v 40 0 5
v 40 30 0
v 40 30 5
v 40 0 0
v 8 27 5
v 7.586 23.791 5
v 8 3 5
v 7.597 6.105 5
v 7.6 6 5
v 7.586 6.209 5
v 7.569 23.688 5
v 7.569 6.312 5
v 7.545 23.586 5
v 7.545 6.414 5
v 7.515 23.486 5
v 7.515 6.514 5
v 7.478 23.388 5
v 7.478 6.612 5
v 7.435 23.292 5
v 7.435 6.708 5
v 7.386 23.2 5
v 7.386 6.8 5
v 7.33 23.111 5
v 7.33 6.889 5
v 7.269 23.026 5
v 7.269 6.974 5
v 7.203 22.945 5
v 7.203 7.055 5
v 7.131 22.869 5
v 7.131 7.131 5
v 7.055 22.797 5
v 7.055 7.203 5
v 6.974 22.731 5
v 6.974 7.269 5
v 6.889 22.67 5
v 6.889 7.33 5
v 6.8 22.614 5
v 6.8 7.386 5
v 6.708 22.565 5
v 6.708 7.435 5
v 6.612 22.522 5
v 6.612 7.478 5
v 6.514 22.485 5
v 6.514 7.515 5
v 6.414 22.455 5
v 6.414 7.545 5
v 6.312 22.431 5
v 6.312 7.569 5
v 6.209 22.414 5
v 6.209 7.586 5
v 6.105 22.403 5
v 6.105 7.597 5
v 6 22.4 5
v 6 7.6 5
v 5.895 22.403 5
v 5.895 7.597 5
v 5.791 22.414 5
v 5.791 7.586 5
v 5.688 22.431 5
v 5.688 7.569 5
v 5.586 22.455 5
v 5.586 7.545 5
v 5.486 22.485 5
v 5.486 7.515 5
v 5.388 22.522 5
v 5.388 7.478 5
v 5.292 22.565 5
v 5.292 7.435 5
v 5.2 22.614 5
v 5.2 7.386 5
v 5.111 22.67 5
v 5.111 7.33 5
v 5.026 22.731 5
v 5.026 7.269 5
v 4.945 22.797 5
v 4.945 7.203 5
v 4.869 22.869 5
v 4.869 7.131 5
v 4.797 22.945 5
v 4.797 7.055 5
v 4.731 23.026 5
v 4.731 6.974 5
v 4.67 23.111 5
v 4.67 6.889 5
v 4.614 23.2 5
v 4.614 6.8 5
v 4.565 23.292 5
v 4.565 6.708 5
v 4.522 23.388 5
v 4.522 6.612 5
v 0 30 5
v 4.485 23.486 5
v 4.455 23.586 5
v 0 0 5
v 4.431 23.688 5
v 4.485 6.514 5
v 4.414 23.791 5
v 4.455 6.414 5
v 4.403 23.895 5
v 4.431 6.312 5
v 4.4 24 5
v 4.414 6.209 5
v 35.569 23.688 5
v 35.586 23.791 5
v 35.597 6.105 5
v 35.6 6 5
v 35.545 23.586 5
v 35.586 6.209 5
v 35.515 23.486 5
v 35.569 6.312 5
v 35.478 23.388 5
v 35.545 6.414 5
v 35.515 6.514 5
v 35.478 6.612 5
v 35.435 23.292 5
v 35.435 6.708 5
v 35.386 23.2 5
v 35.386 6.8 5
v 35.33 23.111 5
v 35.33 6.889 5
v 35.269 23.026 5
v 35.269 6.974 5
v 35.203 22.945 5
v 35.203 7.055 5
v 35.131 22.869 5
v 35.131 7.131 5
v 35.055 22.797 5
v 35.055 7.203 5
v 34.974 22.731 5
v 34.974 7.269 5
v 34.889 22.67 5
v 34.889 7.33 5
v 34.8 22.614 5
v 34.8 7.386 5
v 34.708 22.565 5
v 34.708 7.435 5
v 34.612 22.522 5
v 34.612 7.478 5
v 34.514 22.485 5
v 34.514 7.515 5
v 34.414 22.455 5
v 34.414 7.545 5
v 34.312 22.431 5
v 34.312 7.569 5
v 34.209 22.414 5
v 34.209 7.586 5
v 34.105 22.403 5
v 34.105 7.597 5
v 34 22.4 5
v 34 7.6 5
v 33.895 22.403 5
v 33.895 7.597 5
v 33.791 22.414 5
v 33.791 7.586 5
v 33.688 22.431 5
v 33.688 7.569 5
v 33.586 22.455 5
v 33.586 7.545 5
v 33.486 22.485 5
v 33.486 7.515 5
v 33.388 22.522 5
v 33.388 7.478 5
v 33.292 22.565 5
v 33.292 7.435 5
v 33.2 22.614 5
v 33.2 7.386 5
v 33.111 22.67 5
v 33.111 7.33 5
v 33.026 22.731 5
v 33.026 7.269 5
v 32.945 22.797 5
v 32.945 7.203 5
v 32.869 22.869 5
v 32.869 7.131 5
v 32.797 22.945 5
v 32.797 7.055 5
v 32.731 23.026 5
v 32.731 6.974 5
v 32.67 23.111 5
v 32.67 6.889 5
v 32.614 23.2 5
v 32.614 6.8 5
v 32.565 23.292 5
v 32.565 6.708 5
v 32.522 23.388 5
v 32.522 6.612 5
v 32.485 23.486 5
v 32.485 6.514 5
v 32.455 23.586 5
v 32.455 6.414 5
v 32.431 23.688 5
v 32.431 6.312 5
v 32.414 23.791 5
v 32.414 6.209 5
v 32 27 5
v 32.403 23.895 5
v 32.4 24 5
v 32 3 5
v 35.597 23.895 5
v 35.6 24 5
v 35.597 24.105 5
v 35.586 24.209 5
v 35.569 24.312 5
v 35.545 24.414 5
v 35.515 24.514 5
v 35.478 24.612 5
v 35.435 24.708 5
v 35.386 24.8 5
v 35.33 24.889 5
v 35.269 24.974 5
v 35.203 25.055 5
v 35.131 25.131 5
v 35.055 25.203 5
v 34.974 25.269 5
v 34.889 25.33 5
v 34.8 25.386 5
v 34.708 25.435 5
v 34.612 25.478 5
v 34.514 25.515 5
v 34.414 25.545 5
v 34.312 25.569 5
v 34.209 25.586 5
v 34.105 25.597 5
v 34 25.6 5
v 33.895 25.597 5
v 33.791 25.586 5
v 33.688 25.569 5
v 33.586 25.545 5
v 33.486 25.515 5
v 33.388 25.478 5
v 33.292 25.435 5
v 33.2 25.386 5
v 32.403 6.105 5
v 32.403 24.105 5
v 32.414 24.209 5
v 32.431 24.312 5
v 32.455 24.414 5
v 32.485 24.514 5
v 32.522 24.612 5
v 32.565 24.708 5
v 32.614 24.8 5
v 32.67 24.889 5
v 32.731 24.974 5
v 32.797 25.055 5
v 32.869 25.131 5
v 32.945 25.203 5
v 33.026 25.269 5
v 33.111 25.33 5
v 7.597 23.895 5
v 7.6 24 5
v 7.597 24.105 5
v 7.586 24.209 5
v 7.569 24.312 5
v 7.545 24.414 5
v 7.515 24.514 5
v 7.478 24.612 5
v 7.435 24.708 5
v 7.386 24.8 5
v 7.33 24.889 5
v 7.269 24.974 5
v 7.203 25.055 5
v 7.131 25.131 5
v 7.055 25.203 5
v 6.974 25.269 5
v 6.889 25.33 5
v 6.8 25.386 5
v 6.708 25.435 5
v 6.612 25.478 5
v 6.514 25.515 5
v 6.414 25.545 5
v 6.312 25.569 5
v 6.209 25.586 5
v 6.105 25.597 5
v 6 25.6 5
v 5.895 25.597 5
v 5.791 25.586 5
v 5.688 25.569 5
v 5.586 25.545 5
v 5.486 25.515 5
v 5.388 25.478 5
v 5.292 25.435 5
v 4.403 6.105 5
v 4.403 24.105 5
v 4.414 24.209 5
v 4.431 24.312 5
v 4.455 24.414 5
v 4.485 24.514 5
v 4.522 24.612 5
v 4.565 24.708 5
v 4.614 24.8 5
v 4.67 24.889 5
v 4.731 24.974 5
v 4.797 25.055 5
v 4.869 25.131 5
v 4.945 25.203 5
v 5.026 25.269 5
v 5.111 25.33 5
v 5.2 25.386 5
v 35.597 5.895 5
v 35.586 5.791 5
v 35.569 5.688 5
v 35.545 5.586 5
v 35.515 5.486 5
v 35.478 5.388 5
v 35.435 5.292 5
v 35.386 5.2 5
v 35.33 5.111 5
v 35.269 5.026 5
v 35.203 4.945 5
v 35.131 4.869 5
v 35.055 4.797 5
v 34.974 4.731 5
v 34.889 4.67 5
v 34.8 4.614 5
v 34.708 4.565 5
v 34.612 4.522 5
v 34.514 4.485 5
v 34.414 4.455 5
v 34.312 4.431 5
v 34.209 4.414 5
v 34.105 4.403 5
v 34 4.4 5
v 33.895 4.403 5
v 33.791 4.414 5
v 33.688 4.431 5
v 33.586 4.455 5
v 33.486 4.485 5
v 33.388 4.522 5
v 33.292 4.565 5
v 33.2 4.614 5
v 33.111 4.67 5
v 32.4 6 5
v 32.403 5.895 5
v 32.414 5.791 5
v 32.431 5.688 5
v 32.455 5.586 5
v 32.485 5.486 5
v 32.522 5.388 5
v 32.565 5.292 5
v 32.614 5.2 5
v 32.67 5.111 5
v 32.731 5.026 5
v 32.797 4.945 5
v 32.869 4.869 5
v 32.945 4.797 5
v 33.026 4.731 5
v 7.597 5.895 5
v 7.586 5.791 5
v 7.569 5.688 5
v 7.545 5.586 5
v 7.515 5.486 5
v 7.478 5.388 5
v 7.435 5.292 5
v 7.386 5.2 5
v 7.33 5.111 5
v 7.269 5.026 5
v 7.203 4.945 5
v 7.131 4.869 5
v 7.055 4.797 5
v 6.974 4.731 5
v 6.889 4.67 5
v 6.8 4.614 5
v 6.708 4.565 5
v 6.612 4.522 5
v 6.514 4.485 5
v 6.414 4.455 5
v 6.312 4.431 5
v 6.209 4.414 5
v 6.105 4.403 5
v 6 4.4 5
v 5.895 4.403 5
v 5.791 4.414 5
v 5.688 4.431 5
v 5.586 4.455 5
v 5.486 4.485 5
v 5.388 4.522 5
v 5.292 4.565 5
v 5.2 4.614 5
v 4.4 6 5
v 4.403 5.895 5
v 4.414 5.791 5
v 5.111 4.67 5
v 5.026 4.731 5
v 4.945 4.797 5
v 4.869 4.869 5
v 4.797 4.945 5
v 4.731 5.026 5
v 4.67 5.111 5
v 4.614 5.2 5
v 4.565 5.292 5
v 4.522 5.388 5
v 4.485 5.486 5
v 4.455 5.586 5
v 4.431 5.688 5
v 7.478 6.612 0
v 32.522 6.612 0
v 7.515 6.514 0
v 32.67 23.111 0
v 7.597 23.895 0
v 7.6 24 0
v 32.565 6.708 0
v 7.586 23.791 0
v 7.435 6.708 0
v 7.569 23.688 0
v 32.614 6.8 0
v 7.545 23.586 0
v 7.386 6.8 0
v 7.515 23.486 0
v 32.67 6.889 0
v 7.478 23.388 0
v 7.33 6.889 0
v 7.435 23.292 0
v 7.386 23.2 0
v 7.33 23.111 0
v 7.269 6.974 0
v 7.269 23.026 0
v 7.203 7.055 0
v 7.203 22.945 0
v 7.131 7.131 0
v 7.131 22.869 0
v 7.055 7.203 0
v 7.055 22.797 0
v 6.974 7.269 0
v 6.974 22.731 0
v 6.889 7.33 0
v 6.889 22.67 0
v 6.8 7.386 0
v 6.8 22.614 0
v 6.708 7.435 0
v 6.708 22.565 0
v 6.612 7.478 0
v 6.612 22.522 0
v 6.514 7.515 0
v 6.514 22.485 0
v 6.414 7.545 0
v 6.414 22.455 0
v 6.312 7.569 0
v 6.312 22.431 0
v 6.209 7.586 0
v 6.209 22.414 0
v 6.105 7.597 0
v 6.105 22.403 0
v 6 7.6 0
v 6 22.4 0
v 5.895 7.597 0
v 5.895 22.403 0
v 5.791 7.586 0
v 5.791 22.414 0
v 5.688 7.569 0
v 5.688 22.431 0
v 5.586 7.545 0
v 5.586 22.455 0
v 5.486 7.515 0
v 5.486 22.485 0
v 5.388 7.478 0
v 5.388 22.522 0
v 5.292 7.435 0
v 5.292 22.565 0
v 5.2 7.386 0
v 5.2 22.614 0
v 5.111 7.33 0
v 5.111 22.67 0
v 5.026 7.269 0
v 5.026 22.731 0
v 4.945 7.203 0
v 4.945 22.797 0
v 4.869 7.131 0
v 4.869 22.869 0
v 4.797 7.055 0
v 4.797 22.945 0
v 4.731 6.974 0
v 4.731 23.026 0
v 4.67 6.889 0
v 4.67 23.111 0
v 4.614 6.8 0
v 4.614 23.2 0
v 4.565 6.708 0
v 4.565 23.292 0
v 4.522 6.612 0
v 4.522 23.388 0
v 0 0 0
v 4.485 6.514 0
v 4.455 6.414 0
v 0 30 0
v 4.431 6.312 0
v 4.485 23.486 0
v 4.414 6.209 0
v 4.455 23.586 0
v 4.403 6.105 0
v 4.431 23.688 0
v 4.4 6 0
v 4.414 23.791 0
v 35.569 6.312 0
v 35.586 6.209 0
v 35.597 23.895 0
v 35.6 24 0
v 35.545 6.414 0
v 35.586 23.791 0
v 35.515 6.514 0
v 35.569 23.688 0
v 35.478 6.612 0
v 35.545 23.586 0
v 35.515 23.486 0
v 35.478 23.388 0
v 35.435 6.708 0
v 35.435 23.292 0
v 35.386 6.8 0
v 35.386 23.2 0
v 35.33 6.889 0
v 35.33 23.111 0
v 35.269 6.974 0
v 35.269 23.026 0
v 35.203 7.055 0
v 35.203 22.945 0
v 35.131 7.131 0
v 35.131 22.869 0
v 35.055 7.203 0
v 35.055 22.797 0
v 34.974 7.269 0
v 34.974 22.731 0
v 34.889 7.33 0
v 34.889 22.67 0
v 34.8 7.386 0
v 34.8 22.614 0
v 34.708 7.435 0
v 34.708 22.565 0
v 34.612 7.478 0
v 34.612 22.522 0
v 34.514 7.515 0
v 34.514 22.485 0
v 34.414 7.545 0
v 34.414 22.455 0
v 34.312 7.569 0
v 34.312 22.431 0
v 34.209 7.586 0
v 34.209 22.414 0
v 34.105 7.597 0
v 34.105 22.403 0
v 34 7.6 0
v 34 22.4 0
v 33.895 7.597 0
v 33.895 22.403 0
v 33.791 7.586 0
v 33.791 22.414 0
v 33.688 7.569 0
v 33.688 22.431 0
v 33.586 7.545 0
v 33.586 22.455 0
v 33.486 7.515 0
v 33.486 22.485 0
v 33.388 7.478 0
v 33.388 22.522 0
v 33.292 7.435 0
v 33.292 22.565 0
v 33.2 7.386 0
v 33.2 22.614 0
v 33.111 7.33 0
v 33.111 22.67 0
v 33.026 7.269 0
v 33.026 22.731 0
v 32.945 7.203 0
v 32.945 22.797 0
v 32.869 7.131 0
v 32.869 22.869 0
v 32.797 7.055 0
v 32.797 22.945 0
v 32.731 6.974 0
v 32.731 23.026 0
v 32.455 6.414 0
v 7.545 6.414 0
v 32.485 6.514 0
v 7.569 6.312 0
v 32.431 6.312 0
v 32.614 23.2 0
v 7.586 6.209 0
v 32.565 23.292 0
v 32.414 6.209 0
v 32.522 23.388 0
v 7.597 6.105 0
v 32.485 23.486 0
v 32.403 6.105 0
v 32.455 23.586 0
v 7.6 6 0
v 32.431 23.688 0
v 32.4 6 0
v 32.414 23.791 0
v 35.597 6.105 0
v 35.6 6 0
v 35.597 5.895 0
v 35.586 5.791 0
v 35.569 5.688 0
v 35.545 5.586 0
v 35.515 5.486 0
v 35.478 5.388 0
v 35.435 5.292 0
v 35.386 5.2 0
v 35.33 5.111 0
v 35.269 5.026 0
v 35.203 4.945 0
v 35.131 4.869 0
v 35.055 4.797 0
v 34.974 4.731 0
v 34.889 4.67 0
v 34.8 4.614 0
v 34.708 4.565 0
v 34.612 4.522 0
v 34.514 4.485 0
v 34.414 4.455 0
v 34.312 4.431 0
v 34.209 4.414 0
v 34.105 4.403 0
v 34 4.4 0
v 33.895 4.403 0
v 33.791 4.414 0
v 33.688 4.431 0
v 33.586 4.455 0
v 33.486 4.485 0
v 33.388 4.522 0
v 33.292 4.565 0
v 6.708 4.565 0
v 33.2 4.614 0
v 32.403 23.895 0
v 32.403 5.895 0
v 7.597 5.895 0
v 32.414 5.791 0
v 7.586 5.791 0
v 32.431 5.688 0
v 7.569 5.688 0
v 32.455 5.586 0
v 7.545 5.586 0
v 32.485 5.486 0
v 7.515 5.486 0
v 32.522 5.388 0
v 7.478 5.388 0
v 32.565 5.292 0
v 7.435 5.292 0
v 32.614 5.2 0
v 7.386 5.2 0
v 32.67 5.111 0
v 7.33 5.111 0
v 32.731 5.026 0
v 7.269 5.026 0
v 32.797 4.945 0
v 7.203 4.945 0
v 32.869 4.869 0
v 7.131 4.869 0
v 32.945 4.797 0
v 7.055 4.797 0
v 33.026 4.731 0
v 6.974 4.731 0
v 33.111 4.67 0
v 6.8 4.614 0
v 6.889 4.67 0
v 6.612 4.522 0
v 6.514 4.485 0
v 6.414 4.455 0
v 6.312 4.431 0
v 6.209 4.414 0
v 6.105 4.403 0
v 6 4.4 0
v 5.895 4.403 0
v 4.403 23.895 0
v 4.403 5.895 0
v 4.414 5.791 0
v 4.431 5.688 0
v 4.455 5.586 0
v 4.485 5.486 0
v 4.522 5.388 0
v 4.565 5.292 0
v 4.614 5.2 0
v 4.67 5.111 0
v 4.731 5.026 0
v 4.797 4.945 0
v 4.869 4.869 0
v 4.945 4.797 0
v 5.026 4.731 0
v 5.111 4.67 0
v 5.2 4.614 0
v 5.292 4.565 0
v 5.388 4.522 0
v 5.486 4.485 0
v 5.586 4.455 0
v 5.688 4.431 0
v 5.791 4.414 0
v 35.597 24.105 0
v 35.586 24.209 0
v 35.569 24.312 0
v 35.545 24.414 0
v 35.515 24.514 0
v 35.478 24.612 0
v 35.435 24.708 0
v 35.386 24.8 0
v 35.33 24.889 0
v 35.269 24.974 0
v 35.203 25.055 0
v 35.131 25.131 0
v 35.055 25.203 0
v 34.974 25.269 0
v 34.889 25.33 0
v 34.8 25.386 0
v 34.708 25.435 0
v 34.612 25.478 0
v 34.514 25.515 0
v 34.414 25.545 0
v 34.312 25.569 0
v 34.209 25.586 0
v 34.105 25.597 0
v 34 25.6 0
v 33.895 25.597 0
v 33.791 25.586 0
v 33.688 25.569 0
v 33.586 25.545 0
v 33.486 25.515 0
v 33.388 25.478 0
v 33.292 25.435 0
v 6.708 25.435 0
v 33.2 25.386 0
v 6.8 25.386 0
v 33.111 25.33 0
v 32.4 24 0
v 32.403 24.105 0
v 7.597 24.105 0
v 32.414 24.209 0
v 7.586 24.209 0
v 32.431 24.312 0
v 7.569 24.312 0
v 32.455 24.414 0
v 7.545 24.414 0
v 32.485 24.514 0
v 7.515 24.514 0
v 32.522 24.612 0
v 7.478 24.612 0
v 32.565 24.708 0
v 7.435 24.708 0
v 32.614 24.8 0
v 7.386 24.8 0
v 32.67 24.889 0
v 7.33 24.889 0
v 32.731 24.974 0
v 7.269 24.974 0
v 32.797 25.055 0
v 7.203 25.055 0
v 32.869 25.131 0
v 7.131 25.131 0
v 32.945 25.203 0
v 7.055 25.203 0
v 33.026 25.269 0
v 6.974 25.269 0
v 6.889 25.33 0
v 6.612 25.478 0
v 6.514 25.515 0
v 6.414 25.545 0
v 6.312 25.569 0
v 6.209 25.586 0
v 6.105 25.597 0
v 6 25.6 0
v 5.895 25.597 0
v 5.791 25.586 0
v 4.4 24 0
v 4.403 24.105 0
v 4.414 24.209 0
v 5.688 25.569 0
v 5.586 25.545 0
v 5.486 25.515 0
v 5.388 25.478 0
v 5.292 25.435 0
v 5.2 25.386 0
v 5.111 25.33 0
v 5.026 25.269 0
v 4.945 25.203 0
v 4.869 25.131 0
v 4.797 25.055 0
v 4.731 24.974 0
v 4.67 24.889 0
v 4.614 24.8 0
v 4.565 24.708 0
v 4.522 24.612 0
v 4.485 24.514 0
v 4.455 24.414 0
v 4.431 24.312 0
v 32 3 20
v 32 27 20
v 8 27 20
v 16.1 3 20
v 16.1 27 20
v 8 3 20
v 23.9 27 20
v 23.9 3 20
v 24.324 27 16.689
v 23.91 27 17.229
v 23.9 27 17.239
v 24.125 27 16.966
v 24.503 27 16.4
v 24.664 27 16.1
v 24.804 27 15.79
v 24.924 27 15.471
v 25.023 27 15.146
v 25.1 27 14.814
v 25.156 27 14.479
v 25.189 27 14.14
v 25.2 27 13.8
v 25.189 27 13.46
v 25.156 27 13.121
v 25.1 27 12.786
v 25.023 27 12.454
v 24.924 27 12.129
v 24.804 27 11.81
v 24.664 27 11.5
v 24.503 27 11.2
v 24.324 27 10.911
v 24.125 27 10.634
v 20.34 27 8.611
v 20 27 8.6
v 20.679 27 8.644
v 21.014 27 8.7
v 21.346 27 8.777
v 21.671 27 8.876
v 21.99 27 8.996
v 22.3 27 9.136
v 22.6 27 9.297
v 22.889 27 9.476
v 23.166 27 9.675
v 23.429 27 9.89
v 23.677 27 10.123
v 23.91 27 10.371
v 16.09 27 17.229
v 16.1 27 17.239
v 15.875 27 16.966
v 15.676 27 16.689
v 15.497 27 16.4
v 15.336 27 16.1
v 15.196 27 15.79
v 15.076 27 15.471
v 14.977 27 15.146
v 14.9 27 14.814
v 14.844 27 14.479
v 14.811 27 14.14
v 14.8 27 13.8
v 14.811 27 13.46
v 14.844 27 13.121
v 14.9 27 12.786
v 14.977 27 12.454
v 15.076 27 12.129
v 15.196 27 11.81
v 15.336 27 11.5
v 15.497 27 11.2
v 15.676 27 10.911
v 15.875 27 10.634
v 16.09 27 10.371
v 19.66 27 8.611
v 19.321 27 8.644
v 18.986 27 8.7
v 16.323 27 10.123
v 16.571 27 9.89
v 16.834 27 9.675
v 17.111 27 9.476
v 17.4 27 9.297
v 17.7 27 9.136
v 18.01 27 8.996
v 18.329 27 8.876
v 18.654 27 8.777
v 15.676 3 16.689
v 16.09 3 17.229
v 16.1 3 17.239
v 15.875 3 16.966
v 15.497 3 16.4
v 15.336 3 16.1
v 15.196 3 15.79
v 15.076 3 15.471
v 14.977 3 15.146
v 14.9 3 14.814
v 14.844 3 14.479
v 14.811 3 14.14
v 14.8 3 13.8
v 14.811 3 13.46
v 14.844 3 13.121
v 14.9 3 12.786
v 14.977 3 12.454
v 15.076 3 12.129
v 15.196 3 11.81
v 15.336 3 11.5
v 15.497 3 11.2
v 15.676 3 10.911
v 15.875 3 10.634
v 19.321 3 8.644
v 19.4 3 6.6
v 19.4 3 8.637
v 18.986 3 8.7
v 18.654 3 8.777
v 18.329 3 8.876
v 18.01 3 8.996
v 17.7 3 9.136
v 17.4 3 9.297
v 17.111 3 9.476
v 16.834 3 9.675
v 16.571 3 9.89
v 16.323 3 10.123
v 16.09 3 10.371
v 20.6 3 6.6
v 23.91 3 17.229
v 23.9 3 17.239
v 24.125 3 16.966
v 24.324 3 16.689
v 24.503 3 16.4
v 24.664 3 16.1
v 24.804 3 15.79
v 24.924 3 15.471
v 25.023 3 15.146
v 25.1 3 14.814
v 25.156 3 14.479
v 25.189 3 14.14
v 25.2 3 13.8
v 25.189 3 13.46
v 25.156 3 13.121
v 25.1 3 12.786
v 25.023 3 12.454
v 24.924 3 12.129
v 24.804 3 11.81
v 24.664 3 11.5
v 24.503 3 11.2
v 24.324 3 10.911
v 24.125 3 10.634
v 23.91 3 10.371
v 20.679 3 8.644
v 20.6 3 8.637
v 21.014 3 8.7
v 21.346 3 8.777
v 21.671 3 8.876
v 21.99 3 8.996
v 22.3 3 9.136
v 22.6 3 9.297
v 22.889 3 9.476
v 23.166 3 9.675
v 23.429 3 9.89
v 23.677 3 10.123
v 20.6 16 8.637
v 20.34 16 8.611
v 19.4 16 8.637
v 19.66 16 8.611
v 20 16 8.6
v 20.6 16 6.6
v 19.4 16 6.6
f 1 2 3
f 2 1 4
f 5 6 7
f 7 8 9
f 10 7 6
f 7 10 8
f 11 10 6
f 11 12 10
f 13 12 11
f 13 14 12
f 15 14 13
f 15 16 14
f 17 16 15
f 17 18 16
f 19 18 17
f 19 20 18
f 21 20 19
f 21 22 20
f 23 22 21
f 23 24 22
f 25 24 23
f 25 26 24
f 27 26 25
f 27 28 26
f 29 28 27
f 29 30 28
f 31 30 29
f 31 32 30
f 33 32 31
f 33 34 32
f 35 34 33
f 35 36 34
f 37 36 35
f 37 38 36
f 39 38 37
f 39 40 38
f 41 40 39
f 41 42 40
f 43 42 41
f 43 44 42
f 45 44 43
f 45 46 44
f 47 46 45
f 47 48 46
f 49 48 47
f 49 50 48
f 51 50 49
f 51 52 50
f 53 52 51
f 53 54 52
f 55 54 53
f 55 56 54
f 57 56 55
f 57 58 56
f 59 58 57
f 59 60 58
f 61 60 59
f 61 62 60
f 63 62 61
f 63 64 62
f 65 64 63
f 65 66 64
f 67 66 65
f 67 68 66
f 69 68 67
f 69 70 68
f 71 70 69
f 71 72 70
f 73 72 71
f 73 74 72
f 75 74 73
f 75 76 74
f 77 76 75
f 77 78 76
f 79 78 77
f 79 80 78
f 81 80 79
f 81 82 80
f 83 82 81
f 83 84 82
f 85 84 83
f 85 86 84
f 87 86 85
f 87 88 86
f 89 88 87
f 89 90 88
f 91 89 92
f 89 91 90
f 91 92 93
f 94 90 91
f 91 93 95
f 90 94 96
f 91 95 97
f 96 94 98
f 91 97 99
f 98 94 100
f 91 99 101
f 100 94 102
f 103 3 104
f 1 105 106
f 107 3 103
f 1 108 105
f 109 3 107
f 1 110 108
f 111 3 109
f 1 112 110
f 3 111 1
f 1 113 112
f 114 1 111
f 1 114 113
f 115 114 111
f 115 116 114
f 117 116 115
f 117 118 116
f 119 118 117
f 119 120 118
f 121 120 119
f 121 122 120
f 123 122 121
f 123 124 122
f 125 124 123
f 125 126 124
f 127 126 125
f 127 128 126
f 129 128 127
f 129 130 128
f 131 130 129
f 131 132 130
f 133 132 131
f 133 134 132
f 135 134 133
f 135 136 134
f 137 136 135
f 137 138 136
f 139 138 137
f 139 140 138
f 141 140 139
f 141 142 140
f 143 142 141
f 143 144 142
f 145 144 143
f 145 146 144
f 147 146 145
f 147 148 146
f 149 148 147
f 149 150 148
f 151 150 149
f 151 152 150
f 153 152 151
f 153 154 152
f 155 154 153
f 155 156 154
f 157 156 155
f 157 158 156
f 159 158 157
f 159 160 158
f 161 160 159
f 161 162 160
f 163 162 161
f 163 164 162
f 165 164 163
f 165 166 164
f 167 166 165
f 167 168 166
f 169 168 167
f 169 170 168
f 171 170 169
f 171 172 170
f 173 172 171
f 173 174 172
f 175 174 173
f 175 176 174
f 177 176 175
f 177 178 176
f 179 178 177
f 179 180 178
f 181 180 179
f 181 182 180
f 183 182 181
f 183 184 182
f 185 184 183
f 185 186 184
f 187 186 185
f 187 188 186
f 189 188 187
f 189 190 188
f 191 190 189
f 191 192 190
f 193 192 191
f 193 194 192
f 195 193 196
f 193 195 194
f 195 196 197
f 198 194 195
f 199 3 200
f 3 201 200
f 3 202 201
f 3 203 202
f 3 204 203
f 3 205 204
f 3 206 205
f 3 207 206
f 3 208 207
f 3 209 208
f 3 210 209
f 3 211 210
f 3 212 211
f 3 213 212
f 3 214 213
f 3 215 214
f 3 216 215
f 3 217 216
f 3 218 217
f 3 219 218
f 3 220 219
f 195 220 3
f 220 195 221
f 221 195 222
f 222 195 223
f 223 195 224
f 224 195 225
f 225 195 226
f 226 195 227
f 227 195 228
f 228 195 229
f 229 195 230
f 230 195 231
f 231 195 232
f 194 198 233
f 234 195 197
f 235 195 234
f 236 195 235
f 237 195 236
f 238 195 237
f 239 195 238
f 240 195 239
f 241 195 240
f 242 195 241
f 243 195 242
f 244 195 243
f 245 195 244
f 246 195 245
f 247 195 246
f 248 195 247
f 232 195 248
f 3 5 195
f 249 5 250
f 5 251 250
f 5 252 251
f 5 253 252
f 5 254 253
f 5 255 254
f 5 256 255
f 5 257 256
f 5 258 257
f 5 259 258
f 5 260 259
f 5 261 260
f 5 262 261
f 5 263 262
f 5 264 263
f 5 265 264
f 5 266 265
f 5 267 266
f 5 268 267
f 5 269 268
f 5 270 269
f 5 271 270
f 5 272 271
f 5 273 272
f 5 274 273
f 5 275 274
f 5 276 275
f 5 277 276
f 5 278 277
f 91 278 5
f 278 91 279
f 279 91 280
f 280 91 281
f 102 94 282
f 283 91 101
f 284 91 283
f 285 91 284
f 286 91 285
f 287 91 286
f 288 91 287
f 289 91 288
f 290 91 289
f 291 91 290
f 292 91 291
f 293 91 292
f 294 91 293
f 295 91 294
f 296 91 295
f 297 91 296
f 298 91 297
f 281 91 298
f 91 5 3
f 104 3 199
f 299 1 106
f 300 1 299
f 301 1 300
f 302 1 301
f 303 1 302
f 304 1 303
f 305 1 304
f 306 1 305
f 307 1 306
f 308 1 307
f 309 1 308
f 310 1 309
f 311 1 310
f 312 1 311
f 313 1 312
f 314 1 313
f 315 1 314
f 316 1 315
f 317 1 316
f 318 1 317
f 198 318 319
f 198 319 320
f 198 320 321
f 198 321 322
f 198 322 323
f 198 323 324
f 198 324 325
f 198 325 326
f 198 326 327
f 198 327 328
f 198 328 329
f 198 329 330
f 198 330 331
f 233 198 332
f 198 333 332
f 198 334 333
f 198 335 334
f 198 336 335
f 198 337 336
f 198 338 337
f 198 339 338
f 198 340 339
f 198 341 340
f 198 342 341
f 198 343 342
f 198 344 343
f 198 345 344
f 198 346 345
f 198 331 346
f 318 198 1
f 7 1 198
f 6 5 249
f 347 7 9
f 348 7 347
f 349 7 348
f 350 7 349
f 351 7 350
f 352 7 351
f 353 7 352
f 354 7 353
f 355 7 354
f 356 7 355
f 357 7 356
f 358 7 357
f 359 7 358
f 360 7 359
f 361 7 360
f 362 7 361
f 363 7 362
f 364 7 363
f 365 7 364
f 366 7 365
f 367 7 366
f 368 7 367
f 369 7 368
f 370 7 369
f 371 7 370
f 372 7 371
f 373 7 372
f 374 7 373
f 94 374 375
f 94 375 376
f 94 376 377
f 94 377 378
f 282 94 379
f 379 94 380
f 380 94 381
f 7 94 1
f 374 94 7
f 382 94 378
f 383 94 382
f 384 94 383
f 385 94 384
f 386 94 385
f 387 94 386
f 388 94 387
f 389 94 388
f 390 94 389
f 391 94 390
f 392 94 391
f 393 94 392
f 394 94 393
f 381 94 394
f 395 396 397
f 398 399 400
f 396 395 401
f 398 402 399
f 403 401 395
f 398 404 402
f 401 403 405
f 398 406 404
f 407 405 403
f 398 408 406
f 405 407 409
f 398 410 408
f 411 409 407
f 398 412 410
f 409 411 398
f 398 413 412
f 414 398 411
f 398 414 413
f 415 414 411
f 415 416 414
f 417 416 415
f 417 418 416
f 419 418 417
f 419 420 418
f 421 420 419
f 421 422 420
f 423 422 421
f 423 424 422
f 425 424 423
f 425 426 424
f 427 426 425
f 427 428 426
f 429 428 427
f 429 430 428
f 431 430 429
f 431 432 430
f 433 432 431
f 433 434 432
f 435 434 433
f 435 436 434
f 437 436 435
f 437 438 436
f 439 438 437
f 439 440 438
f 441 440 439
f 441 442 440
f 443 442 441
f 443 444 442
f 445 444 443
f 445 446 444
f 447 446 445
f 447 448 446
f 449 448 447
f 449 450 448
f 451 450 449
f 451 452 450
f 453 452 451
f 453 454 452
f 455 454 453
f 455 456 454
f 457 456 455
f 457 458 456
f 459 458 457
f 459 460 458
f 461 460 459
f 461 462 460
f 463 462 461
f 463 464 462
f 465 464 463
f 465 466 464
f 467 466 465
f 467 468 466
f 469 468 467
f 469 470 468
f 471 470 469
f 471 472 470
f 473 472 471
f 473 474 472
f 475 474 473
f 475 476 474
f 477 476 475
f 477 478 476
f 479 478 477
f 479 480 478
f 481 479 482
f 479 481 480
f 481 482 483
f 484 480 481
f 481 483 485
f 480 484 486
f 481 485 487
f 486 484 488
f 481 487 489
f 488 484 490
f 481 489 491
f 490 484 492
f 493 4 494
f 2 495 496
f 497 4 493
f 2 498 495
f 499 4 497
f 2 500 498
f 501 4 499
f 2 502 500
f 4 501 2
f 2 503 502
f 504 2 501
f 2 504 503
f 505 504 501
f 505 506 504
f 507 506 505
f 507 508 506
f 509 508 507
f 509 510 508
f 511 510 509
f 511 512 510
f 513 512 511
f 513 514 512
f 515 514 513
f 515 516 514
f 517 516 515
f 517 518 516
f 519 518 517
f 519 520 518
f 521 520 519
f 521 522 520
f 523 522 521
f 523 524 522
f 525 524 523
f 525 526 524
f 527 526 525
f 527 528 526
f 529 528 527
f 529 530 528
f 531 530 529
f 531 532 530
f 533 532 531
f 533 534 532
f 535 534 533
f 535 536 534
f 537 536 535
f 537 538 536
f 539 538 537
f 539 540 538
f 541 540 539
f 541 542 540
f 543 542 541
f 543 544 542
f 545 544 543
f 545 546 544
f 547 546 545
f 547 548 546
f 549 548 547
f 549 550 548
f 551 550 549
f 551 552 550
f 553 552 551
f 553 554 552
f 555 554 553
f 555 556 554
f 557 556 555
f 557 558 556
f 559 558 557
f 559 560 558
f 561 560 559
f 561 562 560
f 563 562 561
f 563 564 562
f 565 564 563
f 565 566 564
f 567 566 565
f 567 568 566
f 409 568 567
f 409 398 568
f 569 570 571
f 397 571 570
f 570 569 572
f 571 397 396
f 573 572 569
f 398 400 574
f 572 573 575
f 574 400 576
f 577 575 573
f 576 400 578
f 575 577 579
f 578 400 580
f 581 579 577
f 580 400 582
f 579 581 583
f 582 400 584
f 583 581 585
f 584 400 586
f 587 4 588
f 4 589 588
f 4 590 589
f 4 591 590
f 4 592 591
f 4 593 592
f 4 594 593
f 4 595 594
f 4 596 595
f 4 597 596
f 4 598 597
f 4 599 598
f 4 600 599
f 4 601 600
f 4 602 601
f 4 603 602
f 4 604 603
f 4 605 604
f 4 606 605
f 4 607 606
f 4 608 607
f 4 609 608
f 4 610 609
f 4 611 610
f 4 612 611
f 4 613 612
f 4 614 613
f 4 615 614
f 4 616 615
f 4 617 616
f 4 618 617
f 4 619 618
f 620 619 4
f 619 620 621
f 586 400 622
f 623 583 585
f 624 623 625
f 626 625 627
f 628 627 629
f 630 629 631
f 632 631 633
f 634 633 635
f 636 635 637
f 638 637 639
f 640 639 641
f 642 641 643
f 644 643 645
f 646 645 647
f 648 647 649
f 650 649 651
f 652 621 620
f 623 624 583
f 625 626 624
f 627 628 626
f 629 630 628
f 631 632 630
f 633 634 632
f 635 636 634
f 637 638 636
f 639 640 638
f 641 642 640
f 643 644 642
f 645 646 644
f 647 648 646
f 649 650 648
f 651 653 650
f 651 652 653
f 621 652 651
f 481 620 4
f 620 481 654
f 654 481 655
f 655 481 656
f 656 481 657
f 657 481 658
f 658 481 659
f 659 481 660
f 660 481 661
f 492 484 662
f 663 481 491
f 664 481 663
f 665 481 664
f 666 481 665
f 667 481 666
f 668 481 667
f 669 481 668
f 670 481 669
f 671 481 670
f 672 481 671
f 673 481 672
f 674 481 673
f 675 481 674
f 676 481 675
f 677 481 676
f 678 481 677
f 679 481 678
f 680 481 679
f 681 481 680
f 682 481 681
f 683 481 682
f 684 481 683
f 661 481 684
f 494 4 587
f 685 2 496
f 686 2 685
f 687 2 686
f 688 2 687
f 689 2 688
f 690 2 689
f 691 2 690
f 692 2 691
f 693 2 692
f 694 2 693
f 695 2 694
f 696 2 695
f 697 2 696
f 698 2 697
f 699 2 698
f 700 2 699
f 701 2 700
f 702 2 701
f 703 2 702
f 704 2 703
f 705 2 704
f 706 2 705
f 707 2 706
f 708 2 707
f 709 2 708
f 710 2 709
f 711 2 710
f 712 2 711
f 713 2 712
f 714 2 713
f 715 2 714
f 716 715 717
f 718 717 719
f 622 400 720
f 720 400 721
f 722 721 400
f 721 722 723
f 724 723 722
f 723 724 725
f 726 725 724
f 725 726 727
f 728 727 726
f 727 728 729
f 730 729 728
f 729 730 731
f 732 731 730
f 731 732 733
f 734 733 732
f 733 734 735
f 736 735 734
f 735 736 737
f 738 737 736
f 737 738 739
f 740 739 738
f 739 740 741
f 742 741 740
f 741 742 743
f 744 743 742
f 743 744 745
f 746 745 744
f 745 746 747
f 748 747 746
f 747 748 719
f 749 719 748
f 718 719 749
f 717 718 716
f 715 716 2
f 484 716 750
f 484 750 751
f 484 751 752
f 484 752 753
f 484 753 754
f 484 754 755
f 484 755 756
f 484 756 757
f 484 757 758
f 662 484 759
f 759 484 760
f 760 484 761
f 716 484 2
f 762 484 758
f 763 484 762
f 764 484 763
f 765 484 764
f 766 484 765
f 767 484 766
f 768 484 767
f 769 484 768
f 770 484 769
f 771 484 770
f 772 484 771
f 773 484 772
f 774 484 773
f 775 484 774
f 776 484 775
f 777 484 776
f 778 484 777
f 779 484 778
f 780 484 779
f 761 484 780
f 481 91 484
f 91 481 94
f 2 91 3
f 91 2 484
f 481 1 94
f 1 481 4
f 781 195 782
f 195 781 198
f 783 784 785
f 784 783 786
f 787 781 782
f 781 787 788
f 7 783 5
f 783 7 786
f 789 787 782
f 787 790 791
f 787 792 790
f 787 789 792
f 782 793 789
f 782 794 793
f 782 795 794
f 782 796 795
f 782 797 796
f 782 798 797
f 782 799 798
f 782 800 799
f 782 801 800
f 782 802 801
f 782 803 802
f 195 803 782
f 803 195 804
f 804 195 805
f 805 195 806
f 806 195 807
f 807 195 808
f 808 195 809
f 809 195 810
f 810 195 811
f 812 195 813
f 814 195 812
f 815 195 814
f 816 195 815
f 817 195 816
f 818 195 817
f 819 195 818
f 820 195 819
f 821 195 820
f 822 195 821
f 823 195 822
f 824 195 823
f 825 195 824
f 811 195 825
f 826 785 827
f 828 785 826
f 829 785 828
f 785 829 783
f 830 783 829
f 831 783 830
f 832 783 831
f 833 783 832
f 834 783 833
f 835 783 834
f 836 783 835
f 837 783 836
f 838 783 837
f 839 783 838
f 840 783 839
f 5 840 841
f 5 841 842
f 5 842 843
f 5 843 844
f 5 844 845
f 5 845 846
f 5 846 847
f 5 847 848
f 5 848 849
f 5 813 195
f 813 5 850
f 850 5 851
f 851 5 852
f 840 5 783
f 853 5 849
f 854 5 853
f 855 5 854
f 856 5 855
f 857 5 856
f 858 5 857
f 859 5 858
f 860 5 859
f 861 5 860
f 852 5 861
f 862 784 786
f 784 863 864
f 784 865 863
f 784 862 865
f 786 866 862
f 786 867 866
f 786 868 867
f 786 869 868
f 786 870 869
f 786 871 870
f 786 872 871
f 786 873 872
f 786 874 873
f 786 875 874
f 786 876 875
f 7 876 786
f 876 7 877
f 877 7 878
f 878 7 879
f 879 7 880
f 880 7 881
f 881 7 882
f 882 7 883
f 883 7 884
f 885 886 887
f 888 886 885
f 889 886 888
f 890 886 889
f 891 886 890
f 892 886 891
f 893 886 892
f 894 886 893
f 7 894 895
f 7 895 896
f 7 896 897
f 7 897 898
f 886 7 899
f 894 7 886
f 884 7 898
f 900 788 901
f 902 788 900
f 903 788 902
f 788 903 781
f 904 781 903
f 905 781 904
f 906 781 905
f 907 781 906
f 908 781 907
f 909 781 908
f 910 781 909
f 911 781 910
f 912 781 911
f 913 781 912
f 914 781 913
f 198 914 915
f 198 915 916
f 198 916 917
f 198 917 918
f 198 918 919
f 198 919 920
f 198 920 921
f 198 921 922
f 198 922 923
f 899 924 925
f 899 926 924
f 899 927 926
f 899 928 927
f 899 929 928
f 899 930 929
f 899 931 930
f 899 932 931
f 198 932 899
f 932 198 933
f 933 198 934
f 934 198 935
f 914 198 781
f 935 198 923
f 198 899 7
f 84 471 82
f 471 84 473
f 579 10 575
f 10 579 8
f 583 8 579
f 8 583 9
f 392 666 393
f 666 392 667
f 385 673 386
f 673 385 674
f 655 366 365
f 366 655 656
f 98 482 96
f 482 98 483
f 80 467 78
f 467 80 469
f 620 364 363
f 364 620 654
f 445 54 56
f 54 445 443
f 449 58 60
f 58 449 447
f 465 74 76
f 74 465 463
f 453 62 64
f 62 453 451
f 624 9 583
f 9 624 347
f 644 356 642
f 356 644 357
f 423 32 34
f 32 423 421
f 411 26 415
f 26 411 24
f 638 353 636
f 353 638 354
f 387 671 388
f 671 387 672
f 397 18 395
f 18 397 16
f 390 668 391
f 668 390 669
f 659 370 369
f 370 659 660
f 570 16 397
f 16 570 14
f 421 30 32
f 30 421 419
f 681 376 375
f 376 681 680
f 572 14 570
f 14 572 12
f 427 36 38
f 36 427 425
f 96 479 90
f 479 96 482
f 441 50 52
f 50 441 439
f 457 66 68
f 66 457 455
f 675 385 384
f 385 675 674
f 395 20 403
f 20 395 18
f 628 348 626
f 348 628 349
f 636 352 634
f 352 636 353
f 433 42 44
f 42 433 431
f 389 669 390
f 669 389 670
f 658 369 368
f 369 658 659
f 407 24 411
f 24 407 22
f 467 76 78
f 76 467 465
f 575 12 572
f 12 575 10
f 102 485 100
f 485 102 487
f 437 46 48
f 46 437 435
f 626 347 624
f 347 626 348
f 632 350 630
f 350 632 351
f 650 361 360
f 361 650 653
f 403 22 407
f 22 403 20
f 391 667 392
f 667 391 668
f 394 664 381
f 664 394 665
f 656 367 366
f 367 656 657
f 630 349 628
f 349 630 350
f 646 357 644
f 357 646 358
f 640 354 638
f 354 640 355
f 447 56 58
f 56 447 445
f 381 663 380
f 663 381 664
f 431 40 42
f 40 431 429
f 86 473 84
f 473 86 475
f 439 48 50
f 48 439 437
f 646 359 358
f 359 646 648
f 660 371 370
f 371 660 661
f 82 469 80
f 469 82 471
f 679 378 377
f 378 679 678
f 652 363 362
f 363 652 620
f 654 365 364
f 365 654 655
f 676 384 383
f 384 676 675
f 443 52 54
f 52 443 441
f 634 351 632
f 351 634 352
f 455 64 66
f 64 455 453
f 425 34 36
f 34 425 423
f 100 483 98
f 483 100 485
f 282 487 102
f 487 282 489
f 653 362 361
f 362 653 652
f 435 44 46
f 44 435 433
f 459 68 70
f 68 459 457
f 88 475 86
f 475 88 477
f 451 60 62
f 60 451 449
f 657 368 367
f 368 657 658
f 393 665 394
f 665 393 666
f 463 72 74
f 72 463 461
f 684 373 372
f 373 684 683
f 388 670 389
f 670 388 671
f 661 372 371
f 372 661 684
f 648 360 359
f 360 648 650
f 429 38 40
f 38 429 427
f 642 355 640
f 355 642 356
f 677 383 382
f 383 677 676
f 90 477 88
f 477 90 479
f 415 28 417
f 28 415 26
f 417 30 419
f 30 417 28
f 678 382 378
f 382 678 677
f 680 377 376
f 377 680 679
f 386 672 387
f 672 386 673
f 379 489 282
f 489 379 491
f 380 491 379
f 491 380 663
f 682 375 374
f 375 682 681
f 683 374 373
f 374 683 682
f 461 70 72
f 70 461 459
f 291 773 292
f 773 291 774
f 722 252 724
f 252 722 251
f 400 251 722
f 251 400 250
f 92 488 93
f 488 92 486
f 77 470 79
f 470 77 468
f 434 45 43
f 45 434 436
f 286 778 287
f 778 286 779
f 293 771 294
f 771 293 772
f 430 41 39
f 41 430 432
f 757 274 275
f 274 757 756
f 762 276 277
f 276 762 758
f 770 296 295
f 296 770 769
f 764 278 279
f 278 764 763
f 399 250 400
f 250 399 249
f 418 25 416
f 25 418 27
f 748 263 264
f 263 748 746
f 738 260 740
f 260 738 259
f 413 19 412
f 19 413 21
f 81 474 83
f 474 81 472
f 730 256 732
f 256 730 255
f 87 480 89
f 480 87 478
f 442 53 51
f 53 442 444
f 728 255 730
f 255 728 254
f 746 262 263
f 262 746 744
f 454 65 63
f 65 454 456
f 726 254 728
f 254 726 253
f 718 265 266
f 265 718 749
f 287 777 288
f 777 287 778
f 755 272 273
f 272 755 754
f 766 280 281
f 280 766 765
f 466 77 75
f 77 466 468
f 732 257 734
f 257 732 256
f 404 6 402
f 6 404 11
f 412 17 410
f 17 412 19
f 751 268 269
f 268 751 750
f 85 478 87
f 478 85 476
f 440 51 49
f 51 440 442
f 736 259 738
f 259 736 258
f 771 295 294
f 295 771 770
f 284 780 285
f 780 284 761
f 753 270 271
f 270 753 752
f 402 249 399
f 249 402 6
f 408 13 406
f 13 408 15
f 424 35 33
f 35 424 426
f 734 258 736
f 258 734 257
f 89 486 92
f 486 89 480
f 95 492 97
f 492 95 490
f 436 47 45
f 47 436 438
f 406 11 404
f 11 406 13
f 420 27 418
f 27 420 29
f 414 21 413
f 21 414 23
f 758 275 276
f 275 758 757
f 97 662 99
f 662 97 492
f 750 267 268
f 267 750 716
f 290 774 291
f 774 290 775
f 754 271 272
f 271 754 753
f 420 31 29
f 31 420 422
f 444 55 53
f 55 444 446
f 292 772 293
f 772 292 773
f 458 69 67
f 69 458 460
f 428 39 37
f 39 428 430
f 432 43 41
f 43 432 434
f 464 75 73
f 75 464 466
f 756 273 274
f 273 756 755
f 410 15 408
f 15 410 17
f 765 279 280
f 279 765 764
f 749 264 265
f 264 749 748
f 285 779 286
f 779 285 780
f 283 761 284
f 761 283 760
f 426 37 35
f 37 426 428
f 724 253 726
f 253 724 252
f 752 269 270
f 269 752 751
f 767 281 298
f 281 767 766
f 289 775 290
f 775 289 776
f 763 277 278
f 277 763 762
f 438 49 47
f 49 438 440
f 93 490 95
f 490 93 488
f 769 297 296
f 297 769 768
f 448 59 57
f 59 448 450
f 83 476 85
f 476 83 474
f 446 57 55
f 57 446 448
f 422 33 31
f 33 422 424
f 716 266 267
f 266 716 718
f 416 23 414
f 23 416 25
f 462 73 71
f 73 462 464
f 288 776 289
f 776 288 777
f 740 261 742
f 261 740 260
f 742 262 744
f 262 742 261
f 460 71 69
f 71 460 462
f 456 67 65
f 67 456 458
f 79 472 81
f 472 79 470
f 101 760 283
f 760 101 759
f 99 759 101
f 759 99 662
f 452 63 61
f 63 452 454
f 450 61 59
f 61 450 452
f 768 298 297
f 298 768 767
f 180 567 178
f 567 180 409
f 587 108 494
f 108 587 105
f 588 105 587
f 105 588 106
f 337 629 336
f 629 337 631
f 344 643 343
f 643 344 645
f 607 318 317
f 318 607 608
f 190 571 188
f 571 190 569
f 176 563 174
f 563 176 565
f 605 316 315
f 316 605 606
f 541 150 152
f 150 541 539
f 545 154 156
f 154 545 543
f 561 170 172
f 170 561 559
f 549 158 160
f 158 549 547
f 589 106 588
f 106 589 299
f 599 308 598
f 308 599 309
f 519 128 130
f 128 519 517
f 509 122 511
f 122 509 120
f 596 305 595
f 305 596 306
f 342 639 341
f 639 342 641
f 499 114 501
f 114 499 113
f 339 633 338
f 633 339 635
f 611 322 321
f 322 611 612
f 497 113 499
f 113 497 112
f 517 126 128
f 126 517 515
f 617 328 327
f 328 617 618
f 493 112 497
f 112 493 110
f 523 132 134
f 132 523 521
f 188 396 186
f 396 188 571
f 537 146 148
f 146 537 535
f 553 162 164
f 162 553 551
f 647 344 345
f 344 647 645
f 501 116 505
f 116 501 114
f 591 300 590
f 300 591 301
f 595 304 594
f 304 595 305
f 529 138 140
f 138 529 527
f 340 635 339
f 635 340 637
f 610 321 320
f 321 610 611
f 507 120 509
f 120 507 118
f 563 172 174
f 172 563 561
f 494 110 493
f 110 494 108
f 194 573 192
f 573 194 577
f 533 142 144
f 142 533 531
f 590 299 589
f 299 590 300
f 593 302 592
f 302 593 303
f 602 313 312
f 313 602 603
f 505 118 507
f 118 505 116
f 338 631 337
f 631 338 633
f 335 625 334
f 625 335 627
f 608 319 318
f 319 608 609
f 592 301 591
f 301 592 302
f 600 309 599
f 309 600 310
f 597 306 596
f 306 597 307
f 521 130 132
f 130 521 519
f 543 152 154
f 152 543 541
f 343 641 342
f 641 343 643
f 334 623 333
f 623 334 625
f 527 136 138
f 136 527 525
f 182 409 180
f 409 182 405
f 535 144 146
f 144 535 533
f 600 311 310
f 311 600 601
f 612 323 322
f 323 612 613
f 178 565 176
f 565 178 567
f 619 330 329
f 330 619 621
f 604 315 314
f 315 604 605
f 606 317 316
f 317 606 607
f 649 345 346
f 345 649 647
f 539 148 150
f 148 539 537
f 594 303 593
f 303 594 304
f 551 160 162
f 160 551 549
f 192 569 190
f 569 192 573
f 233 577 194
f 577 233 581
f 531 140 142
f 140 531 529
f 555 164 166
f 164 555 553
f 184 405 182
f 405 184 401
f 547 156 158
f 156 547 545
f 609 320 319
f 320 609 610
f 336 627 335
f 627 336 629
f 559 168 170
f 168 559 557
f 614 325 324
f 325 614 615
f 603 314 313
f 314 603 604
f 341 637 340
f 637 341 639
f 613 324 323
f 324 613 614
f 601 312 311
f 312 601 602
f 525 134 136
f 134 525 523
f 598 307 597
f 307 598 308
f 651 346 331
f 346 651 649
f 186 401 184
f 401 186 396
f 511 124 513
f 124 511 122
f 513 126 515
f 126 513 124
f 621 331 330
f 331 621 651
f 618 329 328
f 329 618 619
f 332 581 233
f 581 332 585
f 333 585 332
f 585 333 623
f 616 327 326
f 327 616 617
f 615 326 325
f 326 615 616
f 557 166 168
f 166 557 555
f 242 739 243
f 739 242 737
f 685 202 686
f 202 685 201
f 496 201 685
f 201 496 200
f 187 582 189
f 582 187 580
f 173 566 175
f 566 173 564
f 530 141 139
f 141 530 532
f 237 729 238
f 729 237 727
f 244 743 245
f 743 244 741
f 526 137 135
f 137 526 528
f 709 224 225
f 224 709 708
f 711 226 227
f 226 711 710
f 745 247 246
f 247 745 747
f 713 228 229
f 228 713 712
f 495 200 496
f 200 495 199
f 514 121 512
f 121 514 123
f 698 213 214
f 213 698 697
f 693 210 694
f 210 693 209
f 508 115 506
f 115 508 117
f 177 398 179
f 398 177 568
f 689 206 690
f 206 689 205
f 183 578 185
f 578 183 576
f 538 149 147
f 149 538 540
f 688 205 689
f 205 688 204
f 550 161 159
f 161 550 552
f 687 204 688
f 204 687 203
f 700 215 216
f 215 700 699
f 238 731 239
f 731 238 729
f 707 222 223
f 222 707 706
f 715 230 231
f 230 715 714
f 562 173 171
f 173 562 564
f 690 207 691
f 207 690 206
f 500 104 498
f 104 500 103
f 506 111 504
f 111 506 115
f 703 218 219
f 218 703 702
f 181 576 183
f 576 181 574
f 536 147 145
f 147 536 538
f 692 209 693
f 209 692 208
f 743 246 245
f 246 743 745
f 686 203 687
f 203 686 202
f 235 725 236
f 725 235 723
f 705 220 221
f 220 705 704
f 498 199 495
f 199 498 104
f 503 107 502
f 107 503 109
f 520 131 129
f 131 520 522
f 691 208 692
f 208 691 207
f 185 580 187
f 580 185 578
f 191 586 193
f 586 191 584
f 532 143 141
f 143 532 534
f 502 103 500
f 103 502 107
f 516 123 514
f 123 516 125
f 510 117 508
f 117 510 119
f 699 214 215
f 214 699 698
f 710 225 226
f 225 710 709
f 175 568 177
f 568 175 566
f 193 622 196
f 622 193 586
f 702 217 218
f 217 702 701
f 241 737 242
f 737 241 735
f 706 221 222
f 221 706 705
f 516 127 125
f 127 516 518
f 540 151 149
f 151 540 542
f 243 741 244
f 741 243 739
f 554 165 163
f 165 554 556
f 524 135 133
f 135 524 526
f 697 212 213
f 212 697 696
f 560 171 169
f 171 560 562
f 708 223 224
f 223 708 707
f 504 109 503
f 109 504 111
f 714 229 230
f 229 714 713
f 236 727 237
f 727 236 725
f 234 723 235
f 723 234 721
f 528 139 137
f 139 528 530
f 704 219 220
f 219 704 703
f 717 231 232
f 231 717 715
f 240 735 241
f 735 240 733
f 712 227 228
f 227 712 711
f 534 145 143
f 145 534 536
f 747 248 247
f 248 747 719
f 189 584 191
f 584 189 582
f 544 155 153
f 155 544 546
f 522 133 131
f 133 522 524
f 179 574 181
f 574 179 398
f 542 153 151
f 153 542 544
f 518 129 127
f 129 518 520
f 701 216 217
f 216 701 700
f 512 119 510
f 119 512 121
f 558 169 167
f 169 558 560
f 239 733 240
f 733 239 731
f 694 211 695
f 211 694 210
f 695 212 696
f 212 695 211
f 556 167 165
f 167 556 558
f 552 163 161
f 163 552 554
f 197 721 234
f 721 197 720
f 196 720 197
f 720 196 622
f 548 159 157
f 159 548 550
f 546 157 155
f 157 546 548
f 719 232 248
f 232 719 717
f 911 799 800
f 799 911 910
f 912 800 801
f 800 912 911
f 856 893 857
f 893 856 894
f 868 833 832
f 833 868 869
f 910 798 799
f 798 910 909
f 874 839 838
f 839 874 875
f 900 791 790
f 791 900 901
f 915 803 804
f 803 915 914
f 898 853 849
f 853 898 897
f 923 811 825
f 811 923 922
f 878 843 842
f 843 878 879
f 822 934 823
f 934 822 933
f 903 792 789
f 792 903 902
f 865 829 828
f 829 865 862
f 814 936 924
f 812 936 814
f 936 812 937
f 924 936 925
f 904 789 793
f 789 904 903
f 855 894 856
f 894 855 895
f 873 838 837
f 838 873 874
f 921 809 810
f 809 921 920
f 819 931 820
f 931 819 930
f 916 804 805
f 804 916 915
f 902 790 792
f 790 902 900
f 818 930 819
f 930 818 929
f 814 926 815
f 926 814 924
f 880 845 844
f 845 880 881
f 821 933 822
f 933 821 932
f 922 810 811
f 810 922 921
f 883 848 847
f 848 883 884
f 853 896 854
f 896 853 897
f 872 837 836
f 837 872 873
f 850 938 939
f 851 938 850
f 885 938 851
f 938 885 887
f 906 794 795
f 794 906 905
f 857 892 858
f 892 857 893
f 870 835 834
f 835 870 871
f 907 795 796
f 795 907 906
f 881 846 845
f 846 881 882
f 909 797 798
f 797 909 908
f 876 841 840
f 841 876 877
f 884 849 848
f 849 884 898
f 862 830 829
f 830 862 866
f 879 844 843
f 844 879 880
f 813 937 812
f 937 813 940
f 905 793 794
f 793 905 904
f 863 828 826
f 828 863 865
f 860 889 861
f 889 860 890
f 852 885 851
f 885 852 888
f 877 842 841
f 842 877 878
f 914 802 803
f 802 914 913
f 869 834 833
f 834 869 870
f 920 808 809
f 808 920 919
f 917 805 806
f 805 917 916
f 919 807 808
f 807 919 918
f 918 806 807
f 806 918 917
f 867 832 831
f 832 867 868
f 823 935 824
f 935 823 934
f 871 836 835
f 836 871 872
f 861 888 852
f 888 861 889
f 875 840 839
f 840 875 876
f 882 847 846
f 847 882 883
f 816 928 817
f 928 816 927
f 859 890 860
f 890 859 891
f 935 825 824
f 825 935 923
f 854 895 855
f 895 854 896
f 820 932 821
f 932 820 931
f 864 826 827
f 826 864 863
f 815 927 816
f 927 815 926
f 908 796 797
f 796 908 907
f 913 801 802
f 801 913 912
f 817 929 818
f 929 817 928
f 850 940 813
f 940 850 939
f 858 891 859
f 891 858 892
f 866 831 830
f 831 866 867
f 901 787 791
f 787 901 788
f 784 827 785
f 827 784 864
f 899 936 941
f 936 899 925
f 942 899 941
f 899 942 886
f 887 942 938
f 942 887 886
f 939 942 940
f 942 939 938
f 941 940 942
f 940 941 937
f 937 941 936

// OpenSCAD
$fn = 96;

module shaft_support_bracket(rod_d=10, total_h=20) {

    // Dimensions (mm)
    base_w = 40;
    base_d = 30;
    base_h = 5;

    block_w = 24;
    block_d = 24;
    block_h = total_h - base_h;

    hole_d = 3.2;
    hole_edge = 6;

    // Rod cradle (U-slot from top)
    cradle_clear = 0.4;
    cradle_d = rod_d + cradle_clear;
    cradle_r = cradle_d/2;

    // Slot opening width (so it is a cradle, not a full bore)
    slot_w = cradle_d * 0.75;

    // Ensure the cradle cuts through the full upper block height
    cradle_cut_h = block_h + 2;

    // Clamp split (thin slit from front to the cradle)
    split_w = 1.2;

    // Coordinate helpers (all solids sit on Z=0)
    base_z0 = 0;
    base_z1 = base_h;
    block_z0 = base_z1;
    block_z1 = total_h;

    // Cradle center height: slightly below top so it forms a U
    cradle_cz = block_z1 - cradle_r - 1.0;

    // Mounting hole positions
    hx1 = hole_edge;
    hx2 = base_w - hole_edge;
    hy1 = hole_edge;
    hy2 = base_d - hole_edge;

    difference() {
        // ONE connected solid body
        union() {
            // Base plate
            translate([0, 0, base_z0])
                cube([base_w, base_d, base_h], center=false);

            // Upper support block centered on base
            translate([(base_w - block_w)/2, (base_d - block_d)/2, block_z0])
                cube([block_w, block_d, block_h], center=false);
        }

        // Rod cradle: cylinder along Y, cut from the top (U-shape)
        translate([base_w/2, base_d/2, cradle_cz])
            rotate([90, 0, 0])
                cylinder(h = block_d + 2, d = cradle_d, center=true);

        // Slot opening to make it a cradle (remove a rectangular window above the cylinder)
        translate([base_w/2 - slot_w/2, base_d/2 - (block_d+2)/2, cradle_cz])
            cube([slot_w, block_d + 2, (block_z1 - cradle_cz) + cradle_r + 2], center=false);

        // Clamp split slit from front face into the cradle area
        translate([base_w/2 - split_w/2, (base_d - block_d)/2 - 1, cradle_cz - cradle_r - 2])
            cube([split_w, block_d/2 + 2, (block_z1 - (cradle_cz - cradle_r - 2)) + 1], center=false);

        // Mounting holes through base
        for (x = [hx1, hx2], y = [hy1, hy2])
            translate([x, y, base_h/2])
                cylinder(h = base_h + 0.6, d = hole_d, center=true);
    }
}

shaft_support_bracket();
